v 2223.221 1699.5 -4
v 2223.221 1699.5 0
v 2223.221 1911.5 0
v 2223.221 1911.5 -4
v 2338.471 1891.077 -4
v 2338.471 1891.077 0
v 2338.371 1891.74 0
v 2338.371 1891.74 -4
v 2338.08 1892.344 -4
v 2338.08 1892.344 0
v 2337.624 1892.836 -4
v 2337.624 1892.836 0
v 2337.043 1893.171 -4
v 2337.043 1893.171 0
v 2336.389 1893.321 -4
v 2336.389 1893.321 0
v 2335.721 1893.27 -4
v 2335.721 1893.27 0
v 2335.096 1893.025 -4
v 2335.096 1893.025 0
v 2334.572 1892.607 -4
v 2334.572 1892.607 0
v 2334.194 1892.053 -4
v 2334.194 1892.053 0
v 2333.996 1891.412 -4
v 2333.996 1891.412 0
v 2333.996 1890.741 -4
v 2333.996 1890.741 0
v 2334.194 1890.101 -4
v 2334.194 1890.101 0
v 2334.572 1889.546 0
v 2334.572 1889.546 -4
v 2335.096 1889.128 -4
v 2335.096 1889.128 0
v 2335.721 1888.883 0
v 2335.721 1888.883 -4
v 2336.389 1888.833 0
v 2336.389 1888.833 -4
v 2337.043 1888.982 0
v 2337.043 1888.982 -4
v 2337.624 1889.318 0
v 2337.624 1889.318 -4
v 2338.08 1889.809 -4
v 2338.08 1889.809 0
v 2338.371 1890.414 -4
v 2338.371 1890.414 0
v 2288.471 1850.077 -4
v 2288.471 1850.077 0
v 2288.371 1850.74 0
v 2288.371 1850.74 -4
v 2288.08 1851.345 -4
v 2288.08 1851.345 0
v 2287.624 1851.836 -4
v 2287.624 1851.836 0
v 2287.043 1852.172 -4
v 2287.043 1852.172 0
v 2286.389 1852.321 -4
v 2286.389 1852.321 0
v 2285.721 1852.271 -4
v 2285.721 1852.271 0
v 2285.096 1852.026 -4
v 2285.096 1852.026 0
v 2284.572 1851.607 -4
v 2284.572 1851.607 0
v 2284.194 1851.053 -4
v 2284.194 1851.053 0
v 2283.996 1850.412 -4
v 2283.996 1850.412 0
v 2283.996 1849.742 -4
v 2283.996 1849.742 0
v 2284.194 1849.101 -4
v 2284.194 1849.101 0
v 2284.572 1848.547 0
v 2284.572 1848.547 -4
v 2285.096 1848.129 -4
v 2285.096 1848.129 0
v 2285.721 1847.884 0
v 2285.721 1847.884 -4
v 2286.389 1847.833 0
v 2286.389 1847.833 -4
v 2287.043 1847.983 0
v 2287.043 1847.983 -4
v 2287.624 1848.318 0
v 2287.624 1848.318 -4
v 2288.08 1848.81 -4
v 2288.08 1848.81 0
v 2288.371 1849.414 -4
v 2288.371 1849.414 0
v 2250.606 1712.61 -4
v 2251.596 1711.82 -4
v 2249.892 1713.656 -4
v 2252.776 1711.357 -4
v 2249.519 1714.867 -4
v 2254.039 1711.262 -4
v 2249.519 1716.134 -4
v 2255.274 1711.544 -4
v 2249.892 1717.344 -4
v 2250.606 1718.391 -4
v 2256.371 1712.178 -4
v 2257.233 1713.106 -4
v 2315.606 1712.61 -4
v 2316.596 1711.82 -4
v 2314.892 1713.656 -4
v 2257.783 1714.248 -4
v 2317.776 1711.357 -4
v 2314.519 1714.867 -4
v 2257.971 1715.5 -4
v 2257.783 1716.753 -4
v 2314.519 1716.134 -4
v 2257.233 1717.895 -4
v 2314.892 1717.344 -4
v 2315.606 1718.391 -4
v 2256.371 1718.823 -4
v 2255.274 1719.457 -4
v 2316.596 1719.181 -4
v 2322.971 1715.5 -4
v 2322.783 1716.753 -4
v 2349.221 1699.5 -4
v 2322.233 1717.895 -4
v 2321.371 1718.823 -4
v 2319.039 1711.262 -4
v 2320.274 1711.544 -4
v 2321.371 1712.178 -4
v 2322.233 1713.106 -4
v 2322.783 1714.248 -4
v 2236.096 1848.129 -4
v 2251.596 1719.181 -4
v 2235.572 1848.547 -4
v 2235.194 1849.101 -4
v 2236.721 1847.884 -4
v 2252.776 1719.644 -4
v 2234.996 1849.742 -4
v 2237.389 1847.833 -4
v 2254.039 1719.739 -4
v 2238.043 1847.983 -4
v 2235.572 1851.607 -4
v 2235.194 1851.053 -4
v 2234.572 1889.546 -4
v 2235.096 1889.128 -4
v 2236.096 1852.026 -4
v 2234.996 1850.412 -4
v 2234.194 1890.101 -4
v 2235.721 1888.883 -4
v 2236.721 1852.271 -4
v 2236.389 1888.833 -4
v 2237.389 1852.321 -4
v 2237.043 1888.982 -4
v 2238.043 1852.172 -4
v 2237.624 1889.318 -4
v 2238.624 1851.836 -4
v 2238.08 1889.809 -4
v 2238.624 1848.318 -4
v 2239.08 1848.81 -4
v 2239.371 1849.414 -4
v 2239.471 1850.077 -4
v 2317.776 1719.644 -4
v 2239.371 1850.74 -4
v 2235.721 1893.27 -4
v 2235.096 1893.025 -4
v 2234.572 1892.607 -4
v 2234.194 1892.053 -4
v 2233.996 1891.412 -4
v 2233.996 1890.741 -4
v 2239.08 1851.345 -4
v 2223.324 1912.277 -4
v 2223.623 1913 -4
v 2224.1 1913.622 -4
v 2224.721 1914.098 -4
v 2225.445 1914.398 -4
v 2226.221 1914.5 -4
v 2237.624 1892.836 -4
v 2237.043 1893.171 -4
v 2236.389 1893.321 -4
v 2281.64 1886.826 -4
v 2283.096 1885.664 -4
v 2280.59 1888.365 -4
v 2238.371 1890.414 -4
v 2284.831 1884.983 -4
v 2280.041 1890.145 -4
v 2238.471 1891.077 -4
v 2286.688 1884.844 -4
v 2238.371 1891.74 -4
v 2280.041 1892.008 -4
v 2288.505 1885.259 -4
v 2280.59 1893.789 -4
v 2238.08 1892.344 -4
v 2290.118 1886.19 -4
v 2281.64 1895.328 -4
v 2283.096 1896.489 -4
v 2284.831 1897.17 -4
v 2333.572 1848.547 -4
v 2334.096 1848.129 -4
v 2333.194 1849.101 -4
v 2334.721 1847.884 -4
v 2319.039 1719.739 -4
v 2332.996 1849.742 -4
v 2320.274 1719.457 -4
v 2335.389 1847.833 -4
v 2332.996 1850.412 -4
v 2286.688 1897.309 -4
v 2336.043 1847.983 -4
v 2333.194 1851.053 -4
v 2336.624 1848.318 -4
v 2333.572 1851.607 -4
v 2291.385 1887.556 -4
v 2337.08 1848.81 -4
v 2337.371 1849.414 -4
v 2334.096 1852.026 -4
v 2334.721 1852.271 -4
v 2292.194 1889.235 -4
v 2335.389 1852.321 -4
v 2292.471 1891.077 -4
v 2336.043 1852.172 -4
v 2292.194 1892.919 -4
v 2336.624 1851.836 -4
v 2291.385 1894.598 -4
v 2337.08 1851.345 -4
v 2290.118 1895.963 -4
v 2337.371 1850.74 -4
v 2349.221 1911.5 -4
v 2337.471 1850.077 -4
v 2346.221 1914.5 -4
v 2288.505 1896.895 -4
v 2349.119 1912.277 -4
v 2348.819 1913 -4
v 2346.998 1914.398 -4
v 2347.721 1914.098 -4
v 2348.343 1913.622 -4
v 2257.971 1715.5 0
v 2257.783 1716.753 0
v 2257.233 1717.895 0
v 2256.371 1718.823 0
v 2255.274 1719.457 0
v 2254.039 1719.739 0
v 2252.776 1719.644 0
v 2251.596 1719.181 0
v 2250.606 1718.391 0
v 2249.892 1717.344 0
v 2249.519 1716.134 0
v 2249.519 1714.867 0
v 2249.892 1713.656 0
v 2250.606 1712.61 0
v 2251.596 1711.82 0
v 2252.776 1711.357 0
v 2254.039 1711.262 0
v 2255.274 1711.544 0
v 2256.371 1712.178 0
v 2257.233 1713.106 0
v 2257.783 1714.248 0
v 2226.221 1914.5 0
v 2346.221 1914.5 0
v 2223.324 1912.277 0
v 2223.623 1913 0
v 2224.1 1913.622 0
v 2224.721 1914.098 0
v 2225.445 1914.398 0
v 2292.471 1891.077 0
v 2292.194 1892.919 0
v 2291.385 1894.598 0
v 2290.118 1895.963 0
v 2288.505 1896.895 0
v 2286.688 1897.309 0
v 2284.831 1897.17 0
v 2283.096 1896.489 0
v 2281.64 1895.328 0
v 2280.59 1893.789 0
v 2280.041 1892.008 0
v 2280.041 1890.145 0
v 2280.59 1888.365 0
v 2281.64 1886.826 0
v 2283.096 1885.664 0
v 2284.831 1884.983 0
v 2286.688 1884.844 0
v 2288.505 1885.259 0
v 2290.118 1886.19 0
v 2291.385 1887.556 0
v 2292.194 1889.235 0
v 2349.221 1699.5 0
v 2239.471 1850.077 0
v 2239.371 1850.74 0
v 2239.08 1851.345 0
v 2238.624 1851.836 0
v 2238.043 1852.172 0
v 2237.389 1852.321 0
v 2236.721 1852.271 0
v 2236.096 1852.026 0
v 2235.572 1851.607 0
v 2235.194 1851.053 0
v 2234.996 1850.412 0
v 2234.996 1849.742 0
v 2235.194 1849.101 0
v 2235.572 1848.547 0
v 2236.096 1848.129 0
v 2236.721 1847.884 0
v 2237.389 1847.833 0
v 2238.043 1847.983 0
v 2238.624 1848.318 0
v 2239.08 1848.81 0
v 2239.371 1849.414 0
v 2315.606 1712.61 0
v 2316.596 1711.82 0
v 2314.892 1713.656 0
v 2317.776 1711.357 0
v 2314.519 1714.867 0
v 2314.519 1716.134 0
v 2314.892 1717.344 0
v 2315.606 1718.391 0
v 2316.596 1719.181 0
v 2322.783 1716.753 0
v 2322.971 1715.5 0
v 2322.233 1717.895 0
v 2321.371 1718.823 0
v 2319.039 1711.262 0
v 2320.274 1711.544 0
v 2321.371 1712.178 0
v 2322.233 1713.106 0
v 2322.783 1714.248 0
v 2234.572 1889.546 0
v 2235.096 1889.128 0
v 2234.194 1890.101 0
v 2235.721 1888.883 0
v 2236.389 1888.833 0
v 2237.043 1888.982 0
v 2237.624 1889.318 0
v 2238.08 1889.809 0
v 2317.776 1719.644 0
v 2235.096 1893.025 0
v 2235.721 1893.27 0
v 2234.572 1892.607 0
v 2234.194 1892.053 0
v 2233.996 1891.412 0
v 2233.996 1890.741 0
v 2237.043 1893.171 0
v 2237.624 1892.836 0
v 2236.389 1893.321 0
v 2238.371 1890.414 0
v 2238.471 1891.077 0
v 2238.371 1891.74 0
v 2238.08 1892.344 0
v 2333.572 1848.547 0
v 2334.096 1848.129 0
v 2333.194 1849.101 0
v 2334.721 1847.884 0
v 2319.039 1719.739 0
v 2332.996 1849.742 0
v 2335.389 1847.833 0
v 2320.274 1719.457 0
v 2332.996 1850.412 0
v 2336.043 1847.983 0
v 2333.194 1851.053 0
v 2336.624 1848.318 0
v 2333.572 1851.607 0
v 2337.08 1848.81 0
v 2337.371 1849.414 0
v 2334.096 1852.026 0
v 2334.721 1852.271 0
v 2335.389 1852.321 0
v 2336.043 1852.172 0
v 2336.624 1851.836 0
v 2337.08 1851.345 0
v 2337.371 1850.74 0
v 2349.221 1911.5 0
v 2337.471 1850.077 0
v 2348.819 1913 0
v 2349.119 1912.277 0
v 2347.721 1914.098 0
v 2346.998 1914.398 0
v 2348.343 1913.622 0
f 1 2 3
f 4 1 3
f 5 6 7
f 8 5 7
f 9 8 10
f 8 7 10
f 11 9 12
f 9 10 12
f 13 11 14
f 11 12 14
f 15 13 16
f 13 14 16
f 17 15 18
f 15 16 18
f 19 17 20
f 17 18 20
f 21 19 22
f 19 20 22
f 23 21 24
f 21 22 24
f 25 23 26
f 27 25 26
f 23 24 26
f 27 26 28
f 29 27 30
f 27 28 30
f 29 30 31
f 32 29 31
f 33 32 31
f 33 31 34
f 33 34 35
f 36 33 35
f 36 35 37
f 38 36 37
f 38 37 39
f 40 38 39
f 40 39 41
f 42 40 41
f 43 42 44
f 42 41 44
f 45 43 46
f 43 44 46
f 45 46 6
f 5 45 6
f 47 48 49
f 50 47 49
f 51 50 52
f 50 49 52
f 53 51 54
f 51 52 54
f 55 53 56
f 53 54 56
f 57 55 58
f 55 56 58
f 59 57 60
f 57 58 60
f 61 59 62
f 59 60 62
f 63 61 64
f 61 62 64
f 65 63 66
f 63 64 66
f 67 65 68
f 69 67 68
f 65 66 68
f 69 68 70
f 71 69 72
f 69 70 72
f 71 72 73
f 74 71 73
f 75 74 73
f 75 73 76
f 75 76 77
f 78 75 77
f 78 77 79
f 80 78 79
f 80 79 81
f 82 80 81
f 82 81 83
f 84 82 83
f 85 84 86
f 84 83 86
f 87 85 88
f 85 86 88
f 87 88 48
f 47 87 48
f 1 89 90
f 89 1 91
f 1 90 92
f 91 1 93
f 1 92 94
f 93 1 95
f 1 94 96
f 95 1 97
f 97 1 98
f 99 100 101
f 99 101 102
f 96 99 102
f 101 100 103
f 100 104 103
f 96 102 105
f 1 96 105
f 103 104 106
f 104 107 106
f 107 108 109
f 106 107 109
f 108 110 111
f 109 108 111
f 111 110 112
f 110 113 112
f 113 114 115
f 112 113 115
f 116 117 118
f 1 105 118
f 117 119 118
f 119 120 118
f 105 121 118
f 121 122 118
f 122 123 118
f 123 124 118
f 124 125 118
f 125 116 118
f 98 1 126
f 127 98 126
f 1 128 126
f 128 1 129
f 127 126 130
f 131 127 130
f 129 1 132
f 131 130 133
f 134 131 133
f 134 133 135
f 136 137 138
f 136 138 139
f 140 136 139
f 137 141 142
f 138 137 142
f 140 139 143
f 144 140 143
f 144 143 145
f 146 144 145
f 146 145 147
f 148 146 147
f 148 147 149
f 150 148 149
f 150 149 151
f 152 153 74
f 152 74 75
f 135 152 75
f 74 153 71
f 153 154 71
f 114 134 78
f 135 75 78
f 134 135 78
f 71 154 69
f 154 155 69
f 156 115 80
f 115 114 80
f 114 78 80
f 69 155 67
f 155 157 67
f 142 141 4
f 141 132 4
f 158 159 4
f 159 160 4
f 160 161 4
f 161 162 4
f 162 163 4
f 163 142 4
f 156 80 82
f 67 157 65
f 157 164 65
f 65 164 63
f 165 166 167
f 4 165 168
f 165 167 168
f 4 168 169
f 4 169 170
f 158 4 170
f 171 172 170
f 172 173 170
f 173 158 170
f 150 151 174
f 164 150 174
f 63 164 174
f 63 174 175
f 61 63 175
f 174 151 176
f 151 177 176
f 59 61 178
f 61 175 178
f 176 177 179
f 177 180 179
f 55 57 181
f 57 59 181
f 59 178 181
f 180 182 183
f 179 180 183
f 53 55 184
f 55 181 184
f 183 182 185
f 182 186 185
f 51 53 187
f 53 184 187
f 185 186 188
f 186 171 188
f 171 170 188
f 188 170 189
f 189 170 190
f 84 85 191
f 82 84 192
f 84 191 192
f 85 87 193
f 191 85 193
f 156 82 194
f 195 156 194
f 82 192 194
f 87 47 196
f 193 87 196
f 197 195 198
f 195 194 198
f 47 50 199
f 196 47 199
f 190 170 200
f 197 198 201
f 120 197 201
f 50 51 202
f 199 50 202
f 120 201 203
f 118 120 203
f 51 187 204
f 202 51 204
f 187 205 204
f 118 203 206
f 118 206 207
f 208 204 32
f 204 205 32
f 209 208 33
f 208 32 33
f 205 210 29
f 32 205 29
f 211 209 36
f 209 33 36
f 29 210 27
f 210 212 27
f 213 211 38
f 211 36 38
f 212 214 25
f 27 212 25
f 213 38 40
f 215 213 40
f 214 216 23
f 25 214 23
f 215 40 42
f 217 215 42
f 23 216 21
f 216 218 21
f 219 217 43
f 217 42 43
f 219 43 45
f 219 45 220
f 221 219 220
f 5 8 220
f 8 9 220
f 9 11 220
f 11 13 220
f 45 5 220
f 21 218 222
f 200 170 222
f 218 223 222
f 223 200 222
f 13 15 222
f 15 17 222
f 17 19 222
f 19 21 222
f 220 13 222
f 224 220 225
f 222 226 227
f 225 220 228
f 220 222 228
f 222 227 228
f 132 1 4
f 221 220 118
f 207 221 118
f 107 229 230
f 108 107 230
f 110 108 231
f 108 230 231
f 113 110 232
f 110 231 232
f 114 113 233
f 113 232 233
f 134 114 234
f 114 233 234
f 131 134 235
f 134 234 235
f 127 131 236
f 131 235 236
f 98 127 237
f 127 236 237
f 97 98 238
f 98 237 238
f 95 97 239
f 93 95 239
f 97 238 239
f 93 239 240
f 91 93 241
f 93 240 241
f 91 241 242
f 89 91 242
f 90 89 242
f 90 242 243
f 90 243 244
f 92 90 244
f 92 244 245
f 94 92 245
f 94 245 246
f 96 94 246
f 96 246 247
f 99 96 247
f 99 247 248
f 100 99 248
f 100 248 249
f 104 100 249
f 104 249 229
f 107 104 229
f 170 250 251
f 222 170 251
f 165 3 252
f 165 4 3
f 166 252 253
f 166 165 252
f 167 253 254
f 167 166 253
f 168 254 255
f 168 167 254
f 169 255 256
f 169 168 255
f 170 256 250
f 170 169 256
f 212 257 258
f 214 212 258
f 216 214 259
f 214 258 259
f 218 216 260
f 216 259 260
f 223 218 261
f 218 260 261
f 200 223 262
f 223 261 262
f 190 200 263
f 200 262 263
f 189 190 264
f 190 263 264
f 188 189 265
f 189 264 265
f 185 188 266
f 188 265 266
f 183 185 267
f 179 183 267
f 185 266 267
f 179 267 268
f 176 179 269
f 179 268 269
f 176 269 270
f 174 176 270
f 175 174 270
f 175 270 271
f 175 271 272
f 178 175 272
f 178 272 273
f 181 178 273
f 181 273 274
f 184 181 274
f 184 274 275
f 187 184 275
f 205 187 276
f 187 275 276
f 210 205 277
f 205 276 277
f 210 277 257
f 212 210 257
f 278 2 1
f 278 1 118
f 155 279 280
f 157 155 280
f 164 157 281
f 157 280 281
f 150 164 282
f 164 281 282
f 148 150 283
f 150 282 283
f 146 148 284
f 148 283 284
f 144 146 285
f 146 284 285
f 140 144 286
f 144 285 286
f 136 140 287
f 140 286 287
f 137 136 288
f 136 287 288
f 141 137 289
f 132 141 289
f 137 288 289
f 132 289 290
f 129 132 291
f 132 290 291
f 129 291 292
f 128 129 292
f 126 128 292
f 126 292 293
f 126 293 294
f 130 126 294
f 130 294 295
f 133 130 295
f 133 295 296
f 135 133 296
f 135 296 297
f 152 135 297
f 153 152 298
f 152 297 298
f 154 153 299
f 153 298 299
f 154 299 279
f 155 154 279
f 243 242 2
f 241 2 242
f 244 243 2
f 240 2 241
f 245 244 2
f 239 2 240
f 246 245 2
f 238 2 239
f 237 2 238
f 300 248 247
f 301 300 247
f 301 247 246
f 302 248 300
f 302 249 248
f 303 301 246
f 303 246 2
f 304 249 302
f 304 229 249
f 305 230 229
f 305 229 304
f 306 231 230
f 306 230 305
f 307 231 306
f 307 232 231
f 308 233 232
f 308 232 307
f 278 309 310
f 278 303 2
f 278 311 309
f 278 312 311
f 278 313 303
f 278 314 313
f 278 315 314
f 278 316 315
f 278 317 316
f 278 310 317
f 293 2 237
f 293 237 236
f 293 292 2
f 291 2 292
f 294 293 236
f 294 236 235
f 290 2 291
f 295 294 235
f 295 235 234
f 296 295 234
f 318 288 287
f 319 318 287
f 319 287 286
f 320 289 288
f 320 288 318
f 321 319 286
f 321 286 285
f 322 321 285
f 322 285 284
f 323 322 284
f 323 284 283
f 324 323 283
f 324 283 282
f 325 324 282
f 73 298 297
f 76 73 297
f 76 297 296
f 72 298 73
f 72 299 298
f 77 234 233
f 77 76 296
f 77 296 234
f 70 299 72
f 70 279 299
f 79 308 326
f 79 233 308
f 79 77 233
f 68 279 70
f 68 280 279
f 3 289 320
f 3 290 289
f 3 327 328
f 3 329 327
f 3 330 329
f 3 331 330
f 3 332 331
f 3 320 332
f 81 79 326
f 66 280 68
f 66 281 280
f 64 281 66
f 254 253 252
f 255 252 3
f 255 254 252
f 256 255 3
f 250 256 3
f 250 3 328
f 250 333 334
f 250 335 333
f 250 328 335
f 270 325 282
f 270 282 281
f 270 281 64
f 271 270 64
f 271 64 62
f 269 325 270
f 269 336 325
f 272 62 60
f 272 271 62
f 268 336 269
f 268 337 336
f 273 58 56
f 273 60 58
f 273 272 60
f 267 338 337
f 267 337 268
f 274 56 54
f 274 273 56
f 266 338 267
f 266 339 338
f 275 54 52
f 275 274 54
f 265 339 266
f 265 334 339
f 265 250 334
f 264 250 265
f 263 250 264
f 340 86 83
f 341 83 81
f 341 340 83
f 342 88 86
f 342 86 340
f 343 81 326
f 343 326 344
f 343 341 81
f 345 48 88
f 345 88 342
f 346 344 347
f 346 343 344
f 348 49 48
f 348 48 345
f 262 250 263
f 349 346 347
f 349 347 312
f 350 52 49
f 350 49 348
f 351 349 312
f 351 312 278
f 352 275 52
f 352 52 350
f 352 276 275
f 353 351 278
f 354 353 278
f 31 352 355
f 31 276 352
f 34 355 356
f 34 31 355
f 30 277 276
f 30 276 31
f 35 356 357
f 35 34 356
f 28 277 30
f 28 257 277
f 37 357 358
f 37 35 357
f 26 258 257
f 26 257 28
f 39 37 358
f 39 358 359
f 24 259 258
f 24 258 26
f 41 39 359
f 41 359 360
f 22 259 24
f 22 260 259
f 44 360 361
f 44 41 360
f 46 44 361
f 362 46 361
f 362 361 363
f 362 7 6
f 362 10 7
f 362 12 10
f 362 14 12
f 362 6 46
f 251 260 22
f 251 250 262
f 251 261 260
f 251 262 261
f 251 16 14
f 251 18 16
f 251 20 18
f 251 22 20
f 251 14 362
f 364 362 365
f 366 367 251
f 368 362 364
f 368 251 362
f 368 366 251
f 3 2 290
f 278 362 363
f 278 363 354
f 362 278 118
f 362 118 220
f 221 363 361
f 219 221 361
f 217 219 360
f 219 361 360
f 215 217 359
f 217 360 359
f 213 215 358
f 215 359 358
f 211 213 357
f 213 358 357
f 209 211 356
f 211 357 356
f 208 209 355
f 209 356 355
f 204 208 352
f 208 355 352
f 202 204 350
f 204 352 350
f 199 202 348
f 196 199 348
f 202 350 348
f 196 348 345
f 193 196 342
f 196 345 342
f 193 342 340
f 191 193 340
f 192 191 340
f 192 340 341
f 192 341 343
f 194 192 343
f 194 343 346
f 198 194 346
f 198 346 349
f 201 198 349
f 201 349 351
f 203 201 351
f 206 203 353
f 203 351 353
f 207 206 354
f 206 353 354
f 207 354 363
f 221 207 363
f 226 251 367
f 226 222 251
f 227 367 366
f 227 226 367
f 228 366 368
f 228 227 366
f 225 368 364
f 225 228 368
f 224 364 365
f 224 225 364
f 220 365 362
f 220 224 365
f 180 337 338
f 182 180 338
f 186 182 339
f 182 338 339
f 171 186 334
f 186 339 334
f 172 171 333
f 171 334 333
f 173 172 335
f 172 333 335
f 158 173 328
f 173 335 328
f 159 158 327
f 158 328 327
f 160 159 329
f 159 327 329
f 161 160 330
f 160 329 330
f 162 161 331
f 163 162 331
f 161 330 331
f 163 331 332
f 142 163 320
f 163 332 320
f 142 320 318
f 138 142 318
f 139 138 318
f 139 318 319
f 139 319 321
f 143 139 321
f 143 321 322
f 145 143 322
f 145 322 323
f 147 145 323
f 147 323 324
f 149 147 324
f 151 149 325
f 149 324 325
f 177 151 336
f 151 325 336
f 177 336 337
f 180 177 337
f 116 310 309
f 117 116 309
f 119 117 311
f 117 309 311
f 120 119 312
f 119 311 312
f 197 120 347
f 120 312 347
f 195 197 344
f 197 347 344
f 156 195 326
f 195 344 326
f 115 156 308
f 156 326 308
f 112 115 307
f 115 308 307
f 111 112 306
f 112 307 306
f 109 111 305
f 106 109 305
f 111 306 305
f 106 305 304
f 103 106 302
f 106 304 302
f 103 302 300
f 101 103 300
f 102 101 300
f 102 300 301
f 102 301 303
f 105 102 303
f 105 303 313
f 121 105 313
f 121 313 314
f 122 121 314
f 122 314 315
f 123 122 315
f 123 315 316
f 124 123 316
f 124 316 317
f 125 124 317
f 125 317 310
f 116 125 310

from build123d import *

# Parameters (mm, degrees)
MODEL_W               = 126
MODEL_H               = 215
MODEL_R               = 4.5
MODEL_R_2             = 6.25
MODEL_R_3             = 2.25
TABAN_FLAN_1_DEPTH    = 4
IZIM1_W               = 106.122730642
IZIM1_H               = 29.615645761
SEKME1_DEPTH          = 4
IZIM4_R               = 4.25
KES_EKSTR_ZYON1_DEPTH = 10
RADYUS1_R             = 3


# Sheet-metal steps are written as plain solids
with BuildPart() as part:
    # Model → Taban-Flanş1 (new body)
    with BuildSketch(Plane.XY):
        with Locations((2286.221333619, 1807.000391939)):
            Rectangle(MODEL_W, MODEL_H)
        with Locations((2253.766329036, 1716.390896724)):
            Circle(MODEL_R, mode=Mode.SUBTRACT)
        with Locations((2318.766329036, 1716.390896724)):
            Circle(MODEL_R, mode=Mode.SUBTRACT)
        with Locations((2286.221329024, 1891.076796715)):
            Circle(MODEL_R_2, mode=Mode.SUBTRACT)
        with Locations((2236.221317757, 1891.076801538)):
            Circle(MODEL_R_3, mode=Mode.SUBTRACT)
        with Locations((2336.221317757, 1891.076801538)):
            Circle(MODEL_R_3, mode=Mode.SUBTRACT)
        with Locations((2237.221333619, 1850.077091939)):
            Circle(MODEL_R_3, mode=Mode.SUBTRACT)
        with Locations((2286.221333601, 1850.077091925)):
            Circle(MODEL_R_3, mode=Mode.SUBTRACT)
        with Locations((2335.22132399, 1850.077101041)):
            Circle(MODEL_R_3, mode=Mode.SUBTRACT)
    extrude(amount=-TABAN_FLAN_1_DEPTH)

    # Çizim1 → Sekme1 (add)
    with BuildSketch(Plane.XY):
        with Locations((2283.753363139, 1720.312928828)):
            Rectangle(IZIM1_W, IZIM1_H)
    extrude(amount=-SEKME1_DEPTH)

    # Çizim4 → Kes-Ekstrüzyon1 (cut)
    with BuildSketch(Plane.XY):
        with Locations((2253.721333619, 1715.500391939)):
            Circle(IZIM4_R)
        with Locations((2318.721333619, 1715.500391939)):
            Circle(IZIM4_R)
    extrude(amount=-KES_EKSTR_ZYON1_DEPTH, mode=Mode.SUBTRACT)

    # Radyus1
    radyus1_edges = [part.edges().sort_by_distance(p)[0] for p in [
        (2223.221333619, 1914.500391939, -2),
        (2349.221333619, 1914.500391939, -2),
    ]]
    fillet(radyus1_edges, radius=RADYUS1_R)


solid = part.part
